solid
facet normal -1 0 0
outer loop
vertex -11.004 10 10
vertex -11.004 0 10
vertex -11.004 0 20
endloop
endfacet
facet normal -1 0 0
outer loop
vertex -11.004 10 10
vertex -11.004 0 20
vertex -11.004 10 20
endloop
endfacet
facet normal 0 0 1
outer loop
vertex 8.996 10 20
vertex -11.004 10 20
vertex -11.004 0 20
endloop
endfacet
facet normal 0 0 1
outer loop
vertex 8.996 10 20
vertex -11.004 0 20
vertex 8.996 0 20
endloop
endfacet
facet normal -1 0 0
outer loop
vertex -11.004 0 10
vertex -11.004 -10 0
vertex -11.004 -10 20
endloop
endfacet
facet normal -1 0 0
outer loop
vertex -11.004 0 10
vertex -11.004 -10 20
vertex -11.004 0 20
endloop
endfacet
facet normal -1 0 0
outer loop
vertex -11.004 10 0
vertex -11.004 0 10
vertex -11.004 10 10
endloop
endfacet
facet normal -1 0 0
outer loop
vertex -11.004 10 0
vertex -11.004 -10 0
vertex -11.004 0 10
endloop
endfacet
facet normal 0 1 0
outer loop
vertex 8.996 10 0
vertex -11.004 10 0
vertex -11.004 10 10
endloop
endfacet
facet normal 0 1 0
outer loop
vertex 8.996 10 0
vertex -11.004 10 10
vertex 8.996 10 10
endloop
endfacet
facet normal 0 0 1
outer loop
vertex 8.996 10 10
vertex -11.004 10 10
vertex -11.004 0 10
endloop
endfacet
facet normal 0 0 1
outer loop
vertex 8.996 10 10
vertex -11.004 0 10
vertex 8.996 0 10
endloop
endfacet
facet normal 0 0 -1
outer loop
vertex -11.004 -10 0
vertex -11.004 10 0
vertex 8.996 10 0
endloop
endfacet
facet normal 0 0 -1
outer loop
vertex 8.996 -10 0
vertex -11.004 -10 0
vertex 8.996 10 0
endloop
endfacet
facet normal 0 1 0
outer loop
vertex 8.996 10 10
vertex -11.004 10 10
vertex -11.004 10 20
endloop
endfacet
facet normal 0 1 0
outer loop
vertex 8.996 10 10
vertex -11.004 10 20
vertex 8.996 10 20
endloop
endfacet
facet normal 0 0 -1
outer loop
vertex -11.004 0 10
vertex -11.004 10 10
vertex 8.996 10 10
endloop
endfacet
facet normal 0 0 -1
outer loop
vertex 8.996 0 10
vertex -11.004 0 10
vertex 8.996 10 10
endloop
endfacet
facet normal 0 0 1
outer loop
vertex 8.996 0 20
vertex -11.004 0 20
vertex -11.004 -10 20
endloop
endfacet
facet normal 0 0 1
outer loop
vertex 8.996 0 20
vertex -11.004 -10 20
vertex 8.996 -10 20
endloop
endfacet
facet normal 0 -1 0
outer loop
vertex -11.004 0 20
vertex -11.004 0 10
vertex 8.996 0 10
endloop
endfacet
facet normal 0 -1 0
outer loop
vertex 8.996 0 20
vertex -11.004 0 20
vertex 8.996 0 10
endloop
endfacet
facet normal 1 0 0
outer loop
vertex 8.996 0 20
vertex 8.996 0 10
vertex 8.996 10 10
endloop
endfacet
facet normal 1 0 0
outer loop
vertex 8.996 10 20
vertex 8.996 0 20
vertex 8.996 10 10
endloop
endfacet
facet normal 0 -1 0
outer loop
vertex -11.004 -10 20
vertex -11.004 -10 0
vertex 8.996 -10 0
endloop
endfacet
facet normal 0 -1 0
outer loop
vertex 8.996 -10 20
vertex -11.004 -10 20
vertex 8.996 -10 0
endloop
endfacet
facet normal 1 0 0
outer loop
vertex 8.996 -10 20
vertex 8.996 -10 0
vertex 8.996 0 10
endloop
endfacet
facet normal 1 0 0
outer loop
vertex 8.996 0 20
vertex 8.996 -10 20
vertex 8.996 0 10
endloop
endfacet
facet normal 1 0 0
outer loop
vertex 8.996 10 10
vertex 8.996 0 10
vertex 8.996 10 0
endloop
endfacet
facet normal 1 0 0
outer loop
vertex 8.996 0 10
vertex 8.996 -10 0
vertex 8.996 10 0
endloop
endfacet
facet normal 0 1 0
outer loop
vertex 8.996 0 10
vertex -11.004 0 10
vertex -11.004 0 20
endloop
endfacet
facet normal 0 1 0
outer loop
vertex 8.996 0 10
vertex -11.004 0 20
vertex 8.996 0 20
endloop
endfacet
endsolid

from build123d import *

# Parameters (mm, degrees)
F0_W      = 20
F0_H      = 10
F1_DEPTH  = 20
F2_DEPTH  = 10
F2_FACE_W = 20
F2_FACE_H = 10
F3_DEPTH  = 10


with BuildPart() as f1:
    # F0 (on Top) → F1 (new body)
    with BuildSketch(Plane.XY):
        with Locations((-1.004017, -5)):
            Rectangle(F0_W, F0_H)
    extrude(amount=F1_DEPTH)

    # F0 (on Top) → F2 (join)
    with BuildSketch(Plane.XY):
        with Locations((-1.004017, 5)):
            Rectangle(F0_W, F0_H)
    extrude(amount=F2_DEPTH)


with BuildPart() as f3:
    # F2_face (on face) → F3 (new body)
    with BuildSketch(Plane(origin=(-1.004017, 5, 10), x_dir=(1, 0, 0), z_dir=(0, 0, 1))):
        Rectangle(F2_FACE_W, F2_FACE_H)
    extrude(amount=F3_DEPTH)


solid = Compound([f1.part, f3.part])
